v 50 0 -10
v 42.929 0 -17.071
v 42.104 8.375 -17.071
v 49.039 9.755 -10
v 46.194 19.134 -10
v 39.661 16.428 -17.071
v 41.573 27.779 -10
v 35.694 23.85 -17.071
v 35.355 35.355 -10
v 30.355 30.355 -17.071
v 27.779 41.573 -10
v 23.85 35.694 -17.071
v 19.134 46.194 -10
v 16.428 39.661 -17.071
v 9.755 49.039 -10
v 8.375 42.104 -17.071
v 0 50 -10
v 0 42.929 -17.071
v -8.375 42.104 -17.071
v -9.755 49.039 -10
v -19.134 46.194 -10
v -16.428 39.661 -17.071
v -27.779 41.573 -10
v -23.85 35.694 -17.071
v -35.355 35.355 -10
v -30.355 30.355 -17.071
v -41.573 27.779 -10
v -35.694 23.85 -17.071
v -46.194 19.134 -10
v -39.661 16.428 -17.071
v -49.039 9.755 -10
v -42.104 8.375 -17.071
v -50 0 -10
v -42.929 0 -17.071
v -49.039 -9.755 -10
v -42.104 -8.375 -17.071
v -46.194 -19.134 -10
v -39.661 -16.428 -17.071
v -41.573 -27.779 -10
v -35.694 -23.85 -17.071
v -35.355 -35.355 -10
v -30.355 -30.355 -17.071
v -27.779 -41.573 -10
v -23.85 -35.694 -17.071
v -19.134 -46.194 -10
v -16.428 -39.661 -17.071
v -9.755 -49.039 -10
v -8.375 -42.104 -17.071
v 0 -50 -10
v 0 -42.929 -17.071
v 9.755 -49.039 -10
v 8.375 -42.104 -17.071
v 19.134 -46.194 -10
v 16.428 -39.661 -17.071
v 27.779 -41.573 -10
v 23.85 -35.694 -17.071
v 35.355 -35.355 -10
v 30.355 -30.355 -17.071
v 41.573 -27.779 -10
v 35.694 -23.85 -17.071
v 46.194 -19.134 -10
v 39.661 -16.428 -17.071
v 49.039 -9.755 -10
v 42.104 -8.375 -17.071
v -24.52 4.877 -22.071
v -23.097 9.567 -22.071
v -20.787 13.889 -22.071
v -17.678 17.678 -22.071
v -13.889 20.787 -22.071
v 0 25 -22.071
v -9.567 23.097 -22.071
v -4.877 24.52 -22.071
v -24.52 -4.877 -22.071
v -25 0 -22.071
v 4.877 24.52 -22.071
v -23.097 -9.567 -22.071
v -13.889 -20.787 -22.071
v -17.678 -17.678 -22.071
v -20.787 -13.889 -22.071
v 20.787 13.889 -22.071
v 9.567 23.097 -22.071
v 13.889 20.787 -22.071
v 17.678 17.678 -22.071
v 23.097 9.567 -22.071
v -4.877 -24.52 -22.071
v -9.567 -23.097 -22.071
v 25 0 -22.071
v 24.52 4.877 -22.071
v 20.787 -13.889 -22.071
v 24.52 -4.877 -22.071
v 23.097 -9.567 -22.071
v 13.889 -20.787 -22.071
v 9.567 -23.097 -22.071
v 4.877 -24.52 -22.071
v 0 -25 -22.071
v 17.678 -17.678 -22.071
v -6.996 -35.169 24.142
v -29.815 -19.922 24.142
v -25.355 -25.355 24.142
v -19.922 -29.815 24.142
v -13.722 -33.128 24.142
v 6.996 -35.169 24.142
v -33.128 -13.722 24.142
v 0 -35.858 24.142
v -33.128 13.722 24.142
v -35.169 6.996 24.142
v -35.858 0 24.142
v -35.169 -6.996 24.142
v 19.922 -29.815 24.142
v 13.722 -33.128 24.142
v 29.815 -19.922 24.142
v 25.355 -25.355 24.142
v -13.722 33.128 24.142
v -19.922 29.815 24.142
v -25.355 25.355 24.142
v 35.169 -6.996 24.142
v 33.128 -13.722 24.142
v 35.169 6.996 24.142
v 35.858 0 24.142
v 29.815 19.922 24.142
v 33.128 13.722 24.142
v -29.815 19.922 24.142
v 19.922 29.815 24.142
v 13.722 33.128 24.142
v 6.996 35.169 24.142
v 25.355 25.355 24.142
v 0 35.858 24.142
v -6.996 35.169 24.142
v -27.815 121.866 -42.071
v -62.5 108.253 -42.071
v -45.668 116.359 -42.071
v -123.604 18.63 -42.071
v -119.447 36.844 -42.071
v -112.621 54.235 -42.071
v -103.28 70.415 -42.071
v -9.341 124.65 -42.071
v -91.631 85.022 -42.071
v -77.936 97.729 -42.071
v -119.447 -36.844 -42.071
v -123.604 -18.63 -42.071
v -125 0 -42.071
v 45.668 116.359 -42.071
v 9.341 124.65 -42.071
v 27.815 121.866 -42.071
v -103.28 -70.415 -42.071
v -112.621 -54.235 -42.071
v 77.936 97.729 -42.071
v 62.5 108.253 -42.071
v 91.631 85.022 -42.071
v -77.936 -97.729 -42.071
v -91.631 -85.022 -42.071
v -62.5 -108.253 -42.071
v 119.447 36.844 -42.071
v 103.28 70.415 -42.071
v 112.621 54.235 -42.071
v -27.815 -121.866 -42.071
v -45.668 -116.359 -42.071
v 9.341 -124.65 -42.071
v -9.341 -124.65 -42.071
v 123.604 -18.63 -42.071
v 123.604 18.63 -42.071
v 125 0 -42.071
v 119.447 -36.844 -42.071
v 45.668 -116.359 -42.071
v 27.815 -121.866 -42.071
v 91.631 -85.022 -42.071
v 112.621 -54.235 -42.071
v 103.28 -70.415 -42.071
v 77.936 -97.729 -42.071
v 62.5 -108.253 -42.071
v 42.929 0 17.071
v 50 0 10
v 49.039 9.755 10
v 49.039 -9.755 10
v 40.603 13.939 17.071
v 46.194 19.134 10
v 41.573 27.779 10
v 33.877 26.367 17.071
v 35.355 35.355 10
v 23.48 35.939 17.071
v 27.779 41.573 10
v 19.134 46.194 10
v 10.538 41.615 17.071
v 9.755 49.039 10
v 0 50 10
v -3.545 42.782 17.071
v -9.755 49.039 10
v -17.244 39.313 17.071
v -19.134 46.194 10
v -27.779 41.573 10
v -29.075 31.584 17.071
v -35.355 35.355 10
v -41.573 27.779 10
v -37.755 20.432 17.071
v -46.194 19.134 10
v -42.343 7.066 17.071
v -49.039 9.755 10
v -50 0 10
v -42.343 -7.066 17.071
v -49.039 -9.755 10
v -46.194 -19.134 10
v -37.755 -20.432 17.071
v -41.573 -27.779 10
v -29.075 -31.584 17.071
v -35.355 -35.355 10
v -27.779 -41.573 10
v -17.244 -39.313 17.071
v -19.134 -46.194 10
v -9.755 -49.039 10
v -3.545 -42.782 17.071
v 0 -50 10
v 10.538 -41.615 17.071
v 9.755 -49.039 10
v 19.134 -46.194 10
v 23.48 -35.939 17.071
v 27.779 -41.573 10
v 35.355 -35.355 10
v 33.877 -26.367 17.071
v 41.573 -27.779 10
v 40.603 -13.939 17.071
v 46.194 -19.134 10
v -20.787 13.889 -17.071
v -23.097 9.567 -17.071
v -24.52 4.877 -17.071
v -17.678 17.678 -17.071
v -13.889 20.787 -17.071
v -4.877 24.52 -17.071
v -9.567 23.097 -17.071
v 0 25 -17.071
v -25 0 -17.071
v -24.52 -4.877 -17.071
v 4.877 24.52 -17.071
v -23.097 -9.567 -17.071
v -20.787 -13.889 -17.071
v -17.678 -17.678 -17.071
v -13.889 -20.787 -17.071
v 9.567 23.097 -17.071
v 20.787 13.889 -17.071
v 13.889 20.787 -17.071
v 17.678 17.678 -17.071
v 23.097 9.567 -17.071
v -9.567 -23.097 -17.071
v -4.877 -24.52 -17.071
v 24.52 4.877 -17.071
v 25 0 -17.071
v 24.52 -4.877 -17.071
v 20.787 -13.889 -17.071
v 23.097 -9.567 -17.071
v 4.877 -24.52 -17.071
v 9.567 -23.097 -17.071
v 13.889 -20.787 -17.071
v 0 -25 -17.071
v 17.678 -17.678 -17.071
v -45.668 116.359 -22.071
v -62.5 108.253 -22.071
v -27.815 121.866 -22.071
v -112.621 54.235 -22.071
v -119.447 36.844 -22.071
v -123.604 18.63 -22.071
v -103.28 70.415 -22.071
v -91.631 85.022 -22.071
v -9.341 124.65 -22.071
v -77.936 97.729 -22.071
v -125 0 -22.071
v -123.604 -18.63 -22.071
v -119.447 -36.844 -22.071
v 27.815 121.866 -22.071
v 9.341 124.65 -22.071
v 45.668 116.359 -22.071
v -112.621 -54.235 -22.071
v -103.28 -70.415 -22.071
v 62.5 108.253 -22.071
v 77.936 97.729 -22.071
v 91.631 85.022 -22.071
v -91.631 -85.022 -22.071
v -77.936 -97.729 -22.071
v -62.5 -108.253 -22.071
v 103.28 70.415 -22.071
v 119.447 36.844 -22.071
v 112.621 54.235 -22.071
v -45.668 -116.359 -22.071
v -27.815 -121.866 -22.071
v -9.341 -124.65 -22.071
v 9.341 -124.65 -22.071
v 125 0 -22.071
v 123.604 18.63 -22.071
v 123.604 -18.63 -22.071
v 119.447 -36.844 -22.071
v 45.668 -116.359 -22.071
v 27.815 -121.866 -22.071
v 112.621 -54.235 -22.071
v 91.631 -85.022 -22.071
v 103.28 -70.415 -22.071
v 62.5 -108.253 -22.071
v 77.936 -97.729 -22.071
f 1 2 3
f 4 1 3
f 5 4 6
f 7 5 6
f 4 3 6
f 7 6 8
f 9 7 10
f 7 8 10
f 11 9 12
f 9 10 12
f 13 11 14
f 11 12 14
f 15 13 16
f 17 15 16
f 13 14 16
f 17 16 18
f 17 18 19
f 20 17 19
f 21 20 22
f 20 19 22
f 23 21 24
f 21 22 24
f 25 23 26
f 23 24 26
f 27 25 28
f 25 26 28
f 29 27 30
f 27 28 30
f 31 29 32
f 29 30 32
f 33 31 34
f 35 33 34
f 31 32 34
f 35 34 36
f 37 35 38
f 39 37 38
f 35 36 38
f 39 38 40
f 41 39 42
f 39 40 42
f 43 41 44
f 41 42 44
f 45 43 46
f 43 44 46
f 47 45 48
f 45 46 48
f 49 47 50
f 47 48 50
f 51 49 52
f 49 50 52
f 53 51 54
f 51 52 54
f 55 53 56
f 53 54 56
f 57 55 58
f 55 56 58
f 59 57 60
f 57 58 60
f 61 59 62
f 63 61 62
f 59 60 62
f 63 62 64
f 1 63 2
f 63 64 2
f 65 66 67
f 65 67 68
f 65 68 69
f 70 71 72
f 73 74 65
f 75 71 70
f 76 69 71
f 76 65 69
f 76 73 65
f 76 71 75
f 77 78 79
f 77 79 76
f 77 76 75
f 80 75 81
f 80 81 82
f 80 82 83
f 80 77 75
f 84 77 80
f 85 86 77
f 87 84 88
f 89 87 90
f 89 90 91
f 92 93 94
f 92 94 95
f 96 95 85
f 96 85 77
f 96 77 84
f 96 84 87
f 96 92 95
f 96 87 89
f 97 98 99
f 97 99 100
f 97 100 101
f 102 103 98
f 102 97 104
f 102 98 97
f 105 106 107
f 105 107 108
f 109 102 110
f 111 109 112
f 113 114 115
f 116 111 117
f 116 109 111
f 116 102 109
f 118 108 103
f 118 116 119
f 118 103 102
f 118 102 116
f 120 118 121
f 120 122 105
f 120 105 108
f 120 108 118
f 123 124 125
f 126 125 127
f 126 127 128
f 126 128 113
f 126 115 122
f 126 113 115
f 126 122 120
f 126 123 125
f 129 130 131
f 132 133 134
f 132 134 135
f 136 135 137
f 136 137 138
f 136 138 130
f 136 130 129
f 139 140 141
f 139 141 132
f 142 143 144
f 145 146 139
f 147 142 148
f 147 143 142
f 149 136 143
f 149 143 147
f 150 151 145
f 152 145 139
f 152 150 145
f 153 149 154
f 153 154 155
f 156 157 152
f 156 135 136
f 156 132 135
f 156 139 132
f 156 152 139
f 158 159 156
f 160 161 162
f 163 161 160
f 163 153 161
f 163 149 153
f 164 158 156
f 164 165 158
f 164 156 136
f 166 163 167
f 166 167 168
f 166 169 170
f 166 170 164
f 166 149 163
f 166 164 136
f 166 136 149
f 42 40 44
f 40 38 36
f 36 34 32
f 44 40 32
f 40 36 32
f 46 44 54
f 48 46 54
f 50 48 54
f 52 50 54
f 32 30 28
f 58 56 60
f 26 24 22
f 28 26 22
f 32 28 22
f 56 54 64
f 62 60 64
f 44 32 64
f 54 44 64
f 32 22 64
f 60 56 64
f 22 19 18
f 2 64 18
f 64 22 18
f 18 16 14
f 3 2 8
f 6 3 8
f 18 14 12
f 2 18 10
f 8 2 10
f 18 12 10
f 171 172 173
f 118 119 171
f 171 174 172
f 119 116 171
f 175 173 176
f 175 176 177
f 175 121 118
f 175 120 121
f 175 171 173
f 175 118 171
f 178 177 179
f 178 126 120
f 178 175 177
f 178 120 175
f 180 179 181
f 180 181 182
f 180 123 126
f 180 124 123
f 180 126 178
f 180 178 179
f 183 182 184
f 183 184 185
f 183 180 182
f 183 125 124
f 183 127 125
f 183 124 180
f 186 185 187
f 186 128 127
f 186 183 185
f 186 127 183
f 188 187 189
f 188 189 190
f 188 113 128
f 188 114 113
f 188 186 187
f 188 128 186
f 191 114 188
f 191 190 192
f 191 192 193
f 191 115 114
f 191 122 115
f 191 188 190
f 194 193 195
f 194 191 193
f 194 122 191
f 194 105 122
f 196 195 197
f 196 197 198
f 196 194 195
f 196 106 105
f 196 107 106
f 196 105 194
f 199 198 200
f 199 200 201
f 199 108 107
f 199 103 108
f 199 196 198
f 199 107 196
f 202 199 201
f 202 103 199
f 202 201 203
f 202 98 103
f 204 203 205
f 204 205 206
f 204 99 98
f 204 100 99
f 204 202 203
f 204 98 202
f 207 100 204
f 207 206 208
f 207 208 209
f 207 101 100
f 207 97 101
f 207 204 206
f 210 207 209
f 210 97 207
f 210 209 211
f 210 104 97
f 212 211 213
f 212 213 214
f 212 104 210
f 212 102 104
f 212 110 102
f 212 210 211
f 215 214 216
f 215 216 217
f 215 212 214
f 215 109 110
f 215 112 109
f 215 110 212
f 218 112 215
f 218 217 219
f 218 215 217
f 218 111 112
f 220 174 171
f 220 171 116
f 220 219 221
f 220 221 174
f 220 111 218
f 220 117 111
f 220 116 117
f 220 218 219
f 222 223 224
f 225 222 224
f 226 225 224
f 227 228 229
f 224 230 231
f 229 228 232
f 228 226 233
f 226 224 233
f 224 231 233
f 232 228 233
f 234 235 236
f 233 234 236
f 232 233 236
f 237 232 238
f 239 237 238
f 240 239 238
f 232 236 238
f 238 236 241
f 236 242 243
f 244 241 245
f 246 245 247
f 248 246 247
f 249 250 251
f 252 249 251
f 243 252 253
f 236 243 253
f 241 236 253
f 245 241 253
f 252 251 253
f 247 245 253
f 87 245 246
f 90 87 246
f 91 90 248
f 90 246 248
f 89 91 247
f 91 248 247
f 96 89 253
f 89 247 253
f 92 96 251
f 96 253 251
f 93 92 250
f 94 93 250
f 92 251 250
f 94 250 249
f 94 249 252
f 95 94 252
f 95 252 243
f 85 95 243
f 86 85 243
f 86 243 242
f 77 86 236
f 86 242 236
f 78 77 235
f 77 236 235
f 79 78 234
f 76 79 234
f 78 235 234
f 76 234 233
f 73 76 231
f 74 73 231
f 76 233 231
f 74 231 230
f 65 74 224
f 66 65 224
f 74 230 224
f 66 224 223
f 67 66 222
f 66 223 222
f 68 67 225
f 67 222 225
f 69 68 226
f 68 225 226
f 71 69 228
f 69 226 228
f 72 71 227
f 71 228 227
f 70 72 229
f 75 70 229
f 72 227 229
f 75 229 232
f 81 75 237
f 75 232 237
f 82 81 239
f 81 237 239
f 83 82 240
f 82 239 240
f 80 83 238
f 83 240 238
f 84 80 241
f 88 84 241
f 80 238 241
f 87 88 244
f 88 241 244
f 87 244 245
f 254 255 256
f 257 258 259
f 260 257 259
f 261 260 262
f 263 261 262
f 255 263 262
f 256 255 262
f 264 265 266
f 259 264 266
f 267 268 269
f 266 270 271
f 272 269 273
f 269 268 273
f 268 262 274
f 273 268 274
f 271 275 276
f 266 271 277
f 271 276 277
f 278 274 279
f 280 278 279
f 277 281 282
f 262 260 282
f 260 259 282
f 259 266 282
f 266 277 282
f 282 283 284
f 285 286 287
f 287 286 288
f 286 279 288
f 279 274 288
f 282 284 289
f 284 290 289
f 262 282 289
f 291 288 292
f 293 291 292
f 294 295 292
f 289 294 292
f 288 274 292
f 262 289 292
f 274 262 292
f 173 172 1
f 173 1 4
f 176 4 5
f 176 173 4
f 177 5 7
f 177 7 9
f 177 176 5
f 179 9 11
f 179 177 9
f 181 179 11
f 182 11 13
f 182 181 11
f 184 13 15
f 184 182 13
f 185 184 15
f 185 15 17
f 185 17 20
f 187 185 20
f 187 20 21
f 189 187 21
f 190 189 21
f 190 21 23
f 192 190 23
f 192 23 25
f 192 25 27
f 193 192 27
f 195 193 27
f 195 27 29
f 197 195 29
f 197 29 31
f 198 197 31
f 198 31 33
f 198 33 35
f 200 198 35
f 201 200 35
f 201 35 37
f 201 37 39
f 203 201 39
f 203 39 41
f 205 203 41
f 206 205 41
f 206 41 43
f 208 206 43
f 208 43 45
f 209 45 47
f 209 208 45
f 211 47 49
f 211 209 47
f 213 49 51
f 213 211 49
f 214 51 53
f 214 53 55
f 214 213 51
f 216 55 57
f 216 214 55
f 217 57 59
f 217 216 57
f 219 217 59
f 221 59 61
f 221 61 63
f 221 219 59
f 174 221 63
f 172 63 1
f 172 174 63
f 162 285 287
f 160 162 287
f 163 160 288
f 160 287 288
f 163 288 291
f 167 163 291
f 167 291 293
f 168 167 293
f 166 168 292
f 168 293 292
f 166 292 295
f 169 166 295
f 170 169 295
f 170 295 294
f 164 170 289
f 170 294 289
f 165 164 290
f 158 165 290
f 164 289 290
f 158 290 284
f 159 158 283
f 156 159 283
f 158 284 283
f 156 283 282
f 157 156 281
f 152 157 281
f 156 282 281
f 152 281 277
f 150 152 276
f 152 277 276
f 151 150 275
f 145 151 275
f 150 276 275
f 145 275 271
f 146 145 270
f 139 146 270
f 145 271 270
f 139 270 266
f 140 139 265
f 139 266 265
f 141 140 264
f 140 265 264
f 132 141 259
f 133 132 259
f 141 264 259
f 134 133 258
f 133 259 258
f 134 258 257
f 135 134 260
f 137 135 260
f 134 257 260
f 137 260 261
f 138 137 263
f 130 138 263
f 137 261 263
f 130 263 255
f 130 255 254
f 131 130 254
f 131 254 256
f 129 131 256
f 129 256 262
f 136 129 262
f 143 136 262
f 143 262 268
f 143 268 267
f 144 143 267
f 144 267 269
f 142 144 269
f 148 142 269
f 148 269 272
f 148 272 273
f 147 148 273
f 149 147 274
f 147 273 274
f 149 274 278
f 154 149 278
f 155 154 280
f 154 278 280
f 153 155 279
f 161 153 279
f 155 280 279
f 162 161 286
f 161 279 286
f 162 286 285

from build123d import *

# Parameters (mm, degrees)
F0_R          = 50
F1_DEPTH      = 24.142136
F1_DEPTH_BACK = 17.071068
F2_SIZE       = 14.142136
F3_SIZE       = 7.071068
F4_R          = 25
F5_DEPTH      = 5
F6_R          = 125
F6_R_2        = 25
F7_DEPTH      = 20


with BuildPart() as f1:
    # F0 (on Top) → F1 (new body, two sides)
    with BuildSketch(Plane.XY) as f1_sk:
        Circle(F0_R)
    extrude(amount=F1_DEPTH)
    extrude(f1_sk.sketch, amount=-F1_DEPTH_BACK)

    # F2
    f2_edges = [f1.edges().sort_by_distance(p)[0] for p in [
        (-50, 0, 24.142136),
    ]]
    chamfer(f2_edges, length=F2_SIZE)

    # F3
    f3_edges = [f1.edges().sort_by_distance(p)[0] for p in [
        (-50, 0, -17.071068),
    ]]
    chamfer(f3_edges, length=F3_SIZE)


with BuildPart() as f5:
    # F4 (on face) → F5 (new body)
    with BuildSketch(Plane(origin=(0, 0, -17.071068), x_dir=(1, 0, 0), z_dir=(0, 0, -1))):
        Circle(F4_R)
    extrude(amount=F5_DEPTH)


with BuildPart() as f7:
    # F6 (on face) → F7 (new body)
    with BuildSketch(Plane(origin=(0, 0, -22.071068), x_dir=(1, 0, 0), z_dir=(0, 0, -1))):
        Circle(F6_R)
        Circle(F6_R_2, mode=Mode.SUBTRACT)
        Circle(F6_R_2)
    extrude(amount=F7_DEPTH)


solid = Compound([f1.part, f5.part, f7.part])
